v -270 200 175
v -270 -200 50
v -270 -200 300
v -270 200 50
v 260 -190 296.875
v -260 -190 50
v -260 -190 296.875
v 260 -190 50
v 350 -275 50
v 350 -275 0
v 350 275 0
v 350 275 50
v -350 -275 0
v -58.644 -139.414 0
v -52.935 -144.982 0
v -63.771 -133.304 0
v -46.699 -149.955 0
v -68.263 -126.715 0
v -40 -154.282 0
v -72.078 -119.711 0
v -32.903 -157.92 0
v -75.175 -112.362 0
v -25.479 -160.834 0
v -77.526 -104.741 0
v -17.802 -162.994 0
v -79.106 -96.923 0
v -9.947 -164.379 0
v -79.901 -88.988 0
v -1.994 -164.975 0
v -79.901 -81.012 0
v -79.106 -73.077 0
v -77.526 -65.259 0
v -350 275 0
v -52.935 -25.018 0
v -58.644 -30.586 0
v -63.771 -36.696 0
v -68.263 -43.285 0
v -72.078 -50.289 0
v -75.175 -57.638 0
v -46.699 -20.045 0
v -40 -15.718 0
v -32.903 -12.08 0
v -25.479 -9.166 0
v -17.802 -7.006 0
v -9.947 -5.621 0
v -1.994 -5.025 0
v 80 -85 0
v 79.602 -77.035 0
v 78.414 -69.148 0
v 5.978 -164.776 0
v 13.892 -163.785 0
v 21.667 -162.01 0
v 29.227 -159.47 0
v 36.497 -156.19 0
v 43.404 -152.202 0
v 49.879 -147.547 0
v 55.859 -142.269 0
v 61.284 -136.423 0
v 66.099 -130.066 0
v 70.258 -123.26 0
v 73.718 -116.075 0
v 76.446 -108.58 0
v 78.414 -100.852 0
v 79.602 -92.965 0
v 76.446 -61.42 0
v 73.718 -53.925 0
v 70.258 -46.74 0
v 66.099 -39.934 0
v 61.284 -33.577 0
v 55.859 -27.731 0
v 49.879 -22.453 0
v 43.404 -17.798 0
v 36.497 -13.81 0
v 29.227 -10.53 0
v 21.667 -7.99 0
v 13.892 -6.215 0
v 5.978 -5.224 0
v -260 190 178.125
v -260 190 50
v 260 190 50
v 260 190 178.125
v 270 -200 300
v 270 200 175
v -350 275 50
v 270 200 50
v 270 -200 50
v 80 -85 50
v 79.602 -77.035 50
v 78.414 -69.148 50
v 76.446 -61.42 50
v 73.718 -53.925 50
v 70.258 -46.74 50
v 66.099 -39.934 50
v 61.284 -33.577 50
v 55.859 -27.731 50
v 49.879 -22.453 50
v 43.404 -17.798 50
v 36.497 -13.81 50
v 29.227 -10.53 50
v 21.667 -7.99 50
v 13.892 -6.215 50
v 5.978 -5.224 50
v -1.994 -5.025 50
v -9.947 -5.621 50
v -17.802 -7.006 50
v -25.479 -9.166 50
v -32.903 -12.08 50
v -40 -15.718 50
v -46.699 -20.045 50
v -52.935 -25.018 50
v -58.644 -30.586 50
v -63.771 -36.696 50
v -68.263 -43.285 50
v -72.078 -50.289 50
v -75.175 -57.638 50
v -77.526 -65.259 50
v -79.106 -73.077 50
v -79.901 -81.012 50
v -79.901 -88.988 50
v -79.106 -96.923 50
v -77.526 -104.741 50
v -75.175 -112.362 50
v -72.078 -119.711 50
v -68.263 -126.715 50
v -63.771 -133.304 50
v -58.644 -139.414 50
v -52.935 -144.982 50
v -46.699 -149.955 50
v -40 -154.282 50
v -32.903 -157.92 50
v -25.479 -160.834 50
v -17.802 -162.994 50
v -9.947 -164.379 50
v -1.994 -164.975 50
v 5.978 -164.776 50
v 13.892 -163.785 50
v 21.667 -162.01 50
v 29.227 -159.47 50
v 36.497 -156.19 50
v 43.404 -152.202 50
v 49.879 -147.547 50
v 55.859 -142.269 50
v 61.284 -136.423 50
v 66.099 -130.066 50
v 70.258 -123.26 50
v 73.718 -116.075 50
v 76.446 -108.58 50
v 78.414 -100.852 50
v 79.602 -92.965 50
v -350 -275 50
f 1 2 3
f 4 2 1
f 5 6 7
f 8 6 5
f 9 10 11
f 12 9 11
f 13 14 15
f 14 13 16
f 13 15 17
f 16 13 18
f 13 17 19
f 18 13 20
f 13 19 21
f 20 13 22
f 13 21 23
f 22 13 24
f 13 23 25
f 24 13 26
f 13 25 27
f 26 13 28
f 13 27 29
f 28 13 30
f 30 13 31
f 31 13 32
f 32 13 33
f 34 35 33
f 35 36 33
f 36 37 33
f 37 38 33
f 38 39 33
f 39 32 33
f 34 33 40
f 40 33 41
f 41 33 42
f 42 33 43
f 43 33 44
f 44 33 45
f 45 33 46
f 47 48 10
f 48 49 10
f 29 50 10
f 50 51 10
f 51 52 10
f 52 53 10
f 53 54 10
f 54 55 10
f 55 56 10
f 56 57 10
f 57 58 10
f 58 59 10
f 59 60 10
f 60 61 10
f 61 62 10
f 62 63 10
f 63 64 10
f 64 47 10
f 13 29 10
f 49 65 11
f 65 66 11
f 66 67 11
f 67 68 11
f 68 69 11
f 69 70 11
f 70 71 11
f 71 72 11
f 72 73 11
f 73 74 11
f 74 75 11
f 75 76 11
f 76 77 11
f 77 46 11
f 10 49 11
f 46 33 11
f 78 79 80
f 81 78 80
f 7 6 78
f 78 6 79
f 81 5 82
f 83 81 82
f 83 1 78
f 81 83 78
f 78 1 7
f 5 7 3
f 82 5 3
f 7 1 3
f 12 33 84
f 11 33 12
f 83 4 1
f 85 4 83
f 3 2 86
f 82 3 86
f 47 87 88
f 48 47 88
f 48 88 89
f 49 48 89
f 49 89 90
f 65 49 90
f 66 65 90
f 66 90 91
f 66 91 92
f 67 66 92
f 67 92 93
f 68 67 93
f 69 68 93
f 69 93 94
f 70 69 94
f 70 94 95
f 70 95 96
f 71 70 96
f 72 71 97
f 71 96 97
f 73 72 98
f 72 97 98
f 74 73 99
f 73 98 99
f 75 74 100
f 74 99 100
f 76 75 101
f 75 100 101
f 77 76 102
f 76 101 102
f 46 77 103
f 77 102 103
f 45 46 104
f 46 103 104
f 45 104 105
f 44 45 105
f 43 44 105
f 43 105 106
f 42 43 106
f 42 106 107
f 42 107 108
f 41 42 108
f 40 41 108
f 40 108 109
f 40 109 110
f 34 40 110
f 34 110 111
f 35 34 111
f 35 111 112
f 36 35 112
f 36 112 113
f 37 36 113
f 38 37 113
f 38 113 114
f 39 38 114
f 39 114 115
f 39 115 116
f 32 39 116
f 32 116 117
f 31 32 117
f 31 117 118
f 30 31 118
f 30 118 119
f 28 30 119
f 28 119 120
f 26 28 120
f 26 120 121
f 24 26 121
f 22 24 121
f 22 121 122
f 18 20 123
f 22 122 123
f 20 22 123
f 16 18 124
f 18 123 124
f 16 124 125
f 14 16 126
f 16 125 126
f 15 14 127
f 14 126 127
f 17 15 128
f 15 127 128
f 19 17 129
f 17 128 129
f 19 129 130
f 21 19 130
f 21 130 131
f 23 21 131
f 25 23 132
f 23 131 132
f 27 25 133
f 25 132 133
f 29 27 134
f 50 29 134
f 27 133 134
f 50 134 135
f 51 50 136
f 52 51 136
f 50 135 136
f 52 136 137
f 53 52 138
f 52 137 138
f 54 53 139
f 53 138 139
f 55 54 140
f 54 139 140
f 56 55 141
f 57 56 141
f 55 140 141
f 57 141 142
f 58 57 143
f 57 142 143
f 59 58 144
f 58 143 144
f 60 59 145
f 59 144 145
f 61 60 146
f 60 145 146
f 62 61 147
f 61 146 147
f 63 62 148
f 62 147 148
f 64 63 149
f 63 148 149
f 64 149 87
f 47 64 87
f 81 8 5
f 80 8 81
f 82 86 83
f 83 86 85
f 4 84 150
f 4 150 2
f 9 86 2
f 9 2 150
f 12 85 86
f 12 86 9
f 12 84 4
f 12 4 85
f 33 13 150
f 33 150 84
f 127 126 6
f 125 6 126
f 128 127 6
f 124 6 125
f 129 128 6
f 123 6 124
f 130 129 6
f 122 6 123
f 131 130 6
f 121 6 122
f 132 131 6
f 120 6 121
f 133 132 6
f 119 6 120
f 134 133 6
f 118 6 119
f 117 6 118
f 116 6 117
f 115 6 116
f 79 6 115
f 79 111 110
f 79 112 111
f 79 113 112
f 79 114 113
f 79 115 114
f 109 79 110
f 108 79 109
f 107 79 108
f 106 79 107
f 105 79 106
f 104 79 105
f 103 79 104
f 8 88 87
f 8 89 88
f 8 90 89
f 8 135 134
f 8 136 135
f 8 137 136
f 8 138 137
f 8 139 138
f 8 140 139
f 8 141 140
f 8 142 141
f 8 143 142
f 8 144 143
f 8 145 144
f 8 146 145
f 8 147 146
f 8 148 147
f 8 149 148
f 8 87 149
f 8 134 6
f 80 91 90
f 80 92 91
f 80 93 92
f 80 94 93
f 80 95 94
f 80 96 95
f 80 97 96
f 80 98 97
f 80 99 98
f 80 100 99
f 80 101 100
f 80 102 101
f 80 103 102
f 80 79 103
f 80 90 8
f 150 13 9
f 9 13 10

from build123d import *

# Parameters (mm, degrees)
SKETCH2_W           = 700
SKETCH2_H           = 550
BOSS_EXTRUDE1_DEPTH = 50
SKETCH3_W           = 540
SKETCH3_H           = 400
SKETCH3_W_2         = 520
SKETCH3_H_2         = 380
EXTRUDE_THIN1_DEPTH = 250
CUT_EXTRUDE1_DEPTH  = 621
SKETCH7_R           = 80
CUT_EXTRUDE2_DEPTH  = 51


with BuildPart() as part:
    # Sketch2 → Boss-Extrude1 (new body)
    with BuildSketch(Plane.XY):
        Rectangle(SKETCH2_W, SKETCH2_H)
    extrude(amount=BOSS_EXTRUDE1_DEPTH)

    # Sketch3 → Extrude-Thin1 (add)
    with BuildSketch(Plane.XY.offset(50)):
        Rectangle(SKETCH3_W, SKETCH3_H)
        Rectangle(SKETCH3_W_2, SKETCH3_H_2, mode=Mode.SUBTRACT)
    extrude(amount=EXTRUDE_THIN1_DEPTH)

    # Sketch4 → Cut-Extrude1 (cut, through all)
    with BuildSketch(Plane.ZY.offset(270)):
        Polygon((175, 200), (300, -200), (300, 200), align=None)
    extrude(amount=-CUT_EXTRUDE1_DEPTH, mode=Mode.SUBTRACT)

    # Sketch7 → Cut-Extrude2 (cut, through all)
    with BuildSketch(Plane.XY.offset(50)):
        with Locations((0, -85)):
            Circle(SKETCH7_R)
    extrude(amount=-CUT_EXTRUDE2_DEPTH, mode=Mode.SUBTRACT)


solid = part.part
